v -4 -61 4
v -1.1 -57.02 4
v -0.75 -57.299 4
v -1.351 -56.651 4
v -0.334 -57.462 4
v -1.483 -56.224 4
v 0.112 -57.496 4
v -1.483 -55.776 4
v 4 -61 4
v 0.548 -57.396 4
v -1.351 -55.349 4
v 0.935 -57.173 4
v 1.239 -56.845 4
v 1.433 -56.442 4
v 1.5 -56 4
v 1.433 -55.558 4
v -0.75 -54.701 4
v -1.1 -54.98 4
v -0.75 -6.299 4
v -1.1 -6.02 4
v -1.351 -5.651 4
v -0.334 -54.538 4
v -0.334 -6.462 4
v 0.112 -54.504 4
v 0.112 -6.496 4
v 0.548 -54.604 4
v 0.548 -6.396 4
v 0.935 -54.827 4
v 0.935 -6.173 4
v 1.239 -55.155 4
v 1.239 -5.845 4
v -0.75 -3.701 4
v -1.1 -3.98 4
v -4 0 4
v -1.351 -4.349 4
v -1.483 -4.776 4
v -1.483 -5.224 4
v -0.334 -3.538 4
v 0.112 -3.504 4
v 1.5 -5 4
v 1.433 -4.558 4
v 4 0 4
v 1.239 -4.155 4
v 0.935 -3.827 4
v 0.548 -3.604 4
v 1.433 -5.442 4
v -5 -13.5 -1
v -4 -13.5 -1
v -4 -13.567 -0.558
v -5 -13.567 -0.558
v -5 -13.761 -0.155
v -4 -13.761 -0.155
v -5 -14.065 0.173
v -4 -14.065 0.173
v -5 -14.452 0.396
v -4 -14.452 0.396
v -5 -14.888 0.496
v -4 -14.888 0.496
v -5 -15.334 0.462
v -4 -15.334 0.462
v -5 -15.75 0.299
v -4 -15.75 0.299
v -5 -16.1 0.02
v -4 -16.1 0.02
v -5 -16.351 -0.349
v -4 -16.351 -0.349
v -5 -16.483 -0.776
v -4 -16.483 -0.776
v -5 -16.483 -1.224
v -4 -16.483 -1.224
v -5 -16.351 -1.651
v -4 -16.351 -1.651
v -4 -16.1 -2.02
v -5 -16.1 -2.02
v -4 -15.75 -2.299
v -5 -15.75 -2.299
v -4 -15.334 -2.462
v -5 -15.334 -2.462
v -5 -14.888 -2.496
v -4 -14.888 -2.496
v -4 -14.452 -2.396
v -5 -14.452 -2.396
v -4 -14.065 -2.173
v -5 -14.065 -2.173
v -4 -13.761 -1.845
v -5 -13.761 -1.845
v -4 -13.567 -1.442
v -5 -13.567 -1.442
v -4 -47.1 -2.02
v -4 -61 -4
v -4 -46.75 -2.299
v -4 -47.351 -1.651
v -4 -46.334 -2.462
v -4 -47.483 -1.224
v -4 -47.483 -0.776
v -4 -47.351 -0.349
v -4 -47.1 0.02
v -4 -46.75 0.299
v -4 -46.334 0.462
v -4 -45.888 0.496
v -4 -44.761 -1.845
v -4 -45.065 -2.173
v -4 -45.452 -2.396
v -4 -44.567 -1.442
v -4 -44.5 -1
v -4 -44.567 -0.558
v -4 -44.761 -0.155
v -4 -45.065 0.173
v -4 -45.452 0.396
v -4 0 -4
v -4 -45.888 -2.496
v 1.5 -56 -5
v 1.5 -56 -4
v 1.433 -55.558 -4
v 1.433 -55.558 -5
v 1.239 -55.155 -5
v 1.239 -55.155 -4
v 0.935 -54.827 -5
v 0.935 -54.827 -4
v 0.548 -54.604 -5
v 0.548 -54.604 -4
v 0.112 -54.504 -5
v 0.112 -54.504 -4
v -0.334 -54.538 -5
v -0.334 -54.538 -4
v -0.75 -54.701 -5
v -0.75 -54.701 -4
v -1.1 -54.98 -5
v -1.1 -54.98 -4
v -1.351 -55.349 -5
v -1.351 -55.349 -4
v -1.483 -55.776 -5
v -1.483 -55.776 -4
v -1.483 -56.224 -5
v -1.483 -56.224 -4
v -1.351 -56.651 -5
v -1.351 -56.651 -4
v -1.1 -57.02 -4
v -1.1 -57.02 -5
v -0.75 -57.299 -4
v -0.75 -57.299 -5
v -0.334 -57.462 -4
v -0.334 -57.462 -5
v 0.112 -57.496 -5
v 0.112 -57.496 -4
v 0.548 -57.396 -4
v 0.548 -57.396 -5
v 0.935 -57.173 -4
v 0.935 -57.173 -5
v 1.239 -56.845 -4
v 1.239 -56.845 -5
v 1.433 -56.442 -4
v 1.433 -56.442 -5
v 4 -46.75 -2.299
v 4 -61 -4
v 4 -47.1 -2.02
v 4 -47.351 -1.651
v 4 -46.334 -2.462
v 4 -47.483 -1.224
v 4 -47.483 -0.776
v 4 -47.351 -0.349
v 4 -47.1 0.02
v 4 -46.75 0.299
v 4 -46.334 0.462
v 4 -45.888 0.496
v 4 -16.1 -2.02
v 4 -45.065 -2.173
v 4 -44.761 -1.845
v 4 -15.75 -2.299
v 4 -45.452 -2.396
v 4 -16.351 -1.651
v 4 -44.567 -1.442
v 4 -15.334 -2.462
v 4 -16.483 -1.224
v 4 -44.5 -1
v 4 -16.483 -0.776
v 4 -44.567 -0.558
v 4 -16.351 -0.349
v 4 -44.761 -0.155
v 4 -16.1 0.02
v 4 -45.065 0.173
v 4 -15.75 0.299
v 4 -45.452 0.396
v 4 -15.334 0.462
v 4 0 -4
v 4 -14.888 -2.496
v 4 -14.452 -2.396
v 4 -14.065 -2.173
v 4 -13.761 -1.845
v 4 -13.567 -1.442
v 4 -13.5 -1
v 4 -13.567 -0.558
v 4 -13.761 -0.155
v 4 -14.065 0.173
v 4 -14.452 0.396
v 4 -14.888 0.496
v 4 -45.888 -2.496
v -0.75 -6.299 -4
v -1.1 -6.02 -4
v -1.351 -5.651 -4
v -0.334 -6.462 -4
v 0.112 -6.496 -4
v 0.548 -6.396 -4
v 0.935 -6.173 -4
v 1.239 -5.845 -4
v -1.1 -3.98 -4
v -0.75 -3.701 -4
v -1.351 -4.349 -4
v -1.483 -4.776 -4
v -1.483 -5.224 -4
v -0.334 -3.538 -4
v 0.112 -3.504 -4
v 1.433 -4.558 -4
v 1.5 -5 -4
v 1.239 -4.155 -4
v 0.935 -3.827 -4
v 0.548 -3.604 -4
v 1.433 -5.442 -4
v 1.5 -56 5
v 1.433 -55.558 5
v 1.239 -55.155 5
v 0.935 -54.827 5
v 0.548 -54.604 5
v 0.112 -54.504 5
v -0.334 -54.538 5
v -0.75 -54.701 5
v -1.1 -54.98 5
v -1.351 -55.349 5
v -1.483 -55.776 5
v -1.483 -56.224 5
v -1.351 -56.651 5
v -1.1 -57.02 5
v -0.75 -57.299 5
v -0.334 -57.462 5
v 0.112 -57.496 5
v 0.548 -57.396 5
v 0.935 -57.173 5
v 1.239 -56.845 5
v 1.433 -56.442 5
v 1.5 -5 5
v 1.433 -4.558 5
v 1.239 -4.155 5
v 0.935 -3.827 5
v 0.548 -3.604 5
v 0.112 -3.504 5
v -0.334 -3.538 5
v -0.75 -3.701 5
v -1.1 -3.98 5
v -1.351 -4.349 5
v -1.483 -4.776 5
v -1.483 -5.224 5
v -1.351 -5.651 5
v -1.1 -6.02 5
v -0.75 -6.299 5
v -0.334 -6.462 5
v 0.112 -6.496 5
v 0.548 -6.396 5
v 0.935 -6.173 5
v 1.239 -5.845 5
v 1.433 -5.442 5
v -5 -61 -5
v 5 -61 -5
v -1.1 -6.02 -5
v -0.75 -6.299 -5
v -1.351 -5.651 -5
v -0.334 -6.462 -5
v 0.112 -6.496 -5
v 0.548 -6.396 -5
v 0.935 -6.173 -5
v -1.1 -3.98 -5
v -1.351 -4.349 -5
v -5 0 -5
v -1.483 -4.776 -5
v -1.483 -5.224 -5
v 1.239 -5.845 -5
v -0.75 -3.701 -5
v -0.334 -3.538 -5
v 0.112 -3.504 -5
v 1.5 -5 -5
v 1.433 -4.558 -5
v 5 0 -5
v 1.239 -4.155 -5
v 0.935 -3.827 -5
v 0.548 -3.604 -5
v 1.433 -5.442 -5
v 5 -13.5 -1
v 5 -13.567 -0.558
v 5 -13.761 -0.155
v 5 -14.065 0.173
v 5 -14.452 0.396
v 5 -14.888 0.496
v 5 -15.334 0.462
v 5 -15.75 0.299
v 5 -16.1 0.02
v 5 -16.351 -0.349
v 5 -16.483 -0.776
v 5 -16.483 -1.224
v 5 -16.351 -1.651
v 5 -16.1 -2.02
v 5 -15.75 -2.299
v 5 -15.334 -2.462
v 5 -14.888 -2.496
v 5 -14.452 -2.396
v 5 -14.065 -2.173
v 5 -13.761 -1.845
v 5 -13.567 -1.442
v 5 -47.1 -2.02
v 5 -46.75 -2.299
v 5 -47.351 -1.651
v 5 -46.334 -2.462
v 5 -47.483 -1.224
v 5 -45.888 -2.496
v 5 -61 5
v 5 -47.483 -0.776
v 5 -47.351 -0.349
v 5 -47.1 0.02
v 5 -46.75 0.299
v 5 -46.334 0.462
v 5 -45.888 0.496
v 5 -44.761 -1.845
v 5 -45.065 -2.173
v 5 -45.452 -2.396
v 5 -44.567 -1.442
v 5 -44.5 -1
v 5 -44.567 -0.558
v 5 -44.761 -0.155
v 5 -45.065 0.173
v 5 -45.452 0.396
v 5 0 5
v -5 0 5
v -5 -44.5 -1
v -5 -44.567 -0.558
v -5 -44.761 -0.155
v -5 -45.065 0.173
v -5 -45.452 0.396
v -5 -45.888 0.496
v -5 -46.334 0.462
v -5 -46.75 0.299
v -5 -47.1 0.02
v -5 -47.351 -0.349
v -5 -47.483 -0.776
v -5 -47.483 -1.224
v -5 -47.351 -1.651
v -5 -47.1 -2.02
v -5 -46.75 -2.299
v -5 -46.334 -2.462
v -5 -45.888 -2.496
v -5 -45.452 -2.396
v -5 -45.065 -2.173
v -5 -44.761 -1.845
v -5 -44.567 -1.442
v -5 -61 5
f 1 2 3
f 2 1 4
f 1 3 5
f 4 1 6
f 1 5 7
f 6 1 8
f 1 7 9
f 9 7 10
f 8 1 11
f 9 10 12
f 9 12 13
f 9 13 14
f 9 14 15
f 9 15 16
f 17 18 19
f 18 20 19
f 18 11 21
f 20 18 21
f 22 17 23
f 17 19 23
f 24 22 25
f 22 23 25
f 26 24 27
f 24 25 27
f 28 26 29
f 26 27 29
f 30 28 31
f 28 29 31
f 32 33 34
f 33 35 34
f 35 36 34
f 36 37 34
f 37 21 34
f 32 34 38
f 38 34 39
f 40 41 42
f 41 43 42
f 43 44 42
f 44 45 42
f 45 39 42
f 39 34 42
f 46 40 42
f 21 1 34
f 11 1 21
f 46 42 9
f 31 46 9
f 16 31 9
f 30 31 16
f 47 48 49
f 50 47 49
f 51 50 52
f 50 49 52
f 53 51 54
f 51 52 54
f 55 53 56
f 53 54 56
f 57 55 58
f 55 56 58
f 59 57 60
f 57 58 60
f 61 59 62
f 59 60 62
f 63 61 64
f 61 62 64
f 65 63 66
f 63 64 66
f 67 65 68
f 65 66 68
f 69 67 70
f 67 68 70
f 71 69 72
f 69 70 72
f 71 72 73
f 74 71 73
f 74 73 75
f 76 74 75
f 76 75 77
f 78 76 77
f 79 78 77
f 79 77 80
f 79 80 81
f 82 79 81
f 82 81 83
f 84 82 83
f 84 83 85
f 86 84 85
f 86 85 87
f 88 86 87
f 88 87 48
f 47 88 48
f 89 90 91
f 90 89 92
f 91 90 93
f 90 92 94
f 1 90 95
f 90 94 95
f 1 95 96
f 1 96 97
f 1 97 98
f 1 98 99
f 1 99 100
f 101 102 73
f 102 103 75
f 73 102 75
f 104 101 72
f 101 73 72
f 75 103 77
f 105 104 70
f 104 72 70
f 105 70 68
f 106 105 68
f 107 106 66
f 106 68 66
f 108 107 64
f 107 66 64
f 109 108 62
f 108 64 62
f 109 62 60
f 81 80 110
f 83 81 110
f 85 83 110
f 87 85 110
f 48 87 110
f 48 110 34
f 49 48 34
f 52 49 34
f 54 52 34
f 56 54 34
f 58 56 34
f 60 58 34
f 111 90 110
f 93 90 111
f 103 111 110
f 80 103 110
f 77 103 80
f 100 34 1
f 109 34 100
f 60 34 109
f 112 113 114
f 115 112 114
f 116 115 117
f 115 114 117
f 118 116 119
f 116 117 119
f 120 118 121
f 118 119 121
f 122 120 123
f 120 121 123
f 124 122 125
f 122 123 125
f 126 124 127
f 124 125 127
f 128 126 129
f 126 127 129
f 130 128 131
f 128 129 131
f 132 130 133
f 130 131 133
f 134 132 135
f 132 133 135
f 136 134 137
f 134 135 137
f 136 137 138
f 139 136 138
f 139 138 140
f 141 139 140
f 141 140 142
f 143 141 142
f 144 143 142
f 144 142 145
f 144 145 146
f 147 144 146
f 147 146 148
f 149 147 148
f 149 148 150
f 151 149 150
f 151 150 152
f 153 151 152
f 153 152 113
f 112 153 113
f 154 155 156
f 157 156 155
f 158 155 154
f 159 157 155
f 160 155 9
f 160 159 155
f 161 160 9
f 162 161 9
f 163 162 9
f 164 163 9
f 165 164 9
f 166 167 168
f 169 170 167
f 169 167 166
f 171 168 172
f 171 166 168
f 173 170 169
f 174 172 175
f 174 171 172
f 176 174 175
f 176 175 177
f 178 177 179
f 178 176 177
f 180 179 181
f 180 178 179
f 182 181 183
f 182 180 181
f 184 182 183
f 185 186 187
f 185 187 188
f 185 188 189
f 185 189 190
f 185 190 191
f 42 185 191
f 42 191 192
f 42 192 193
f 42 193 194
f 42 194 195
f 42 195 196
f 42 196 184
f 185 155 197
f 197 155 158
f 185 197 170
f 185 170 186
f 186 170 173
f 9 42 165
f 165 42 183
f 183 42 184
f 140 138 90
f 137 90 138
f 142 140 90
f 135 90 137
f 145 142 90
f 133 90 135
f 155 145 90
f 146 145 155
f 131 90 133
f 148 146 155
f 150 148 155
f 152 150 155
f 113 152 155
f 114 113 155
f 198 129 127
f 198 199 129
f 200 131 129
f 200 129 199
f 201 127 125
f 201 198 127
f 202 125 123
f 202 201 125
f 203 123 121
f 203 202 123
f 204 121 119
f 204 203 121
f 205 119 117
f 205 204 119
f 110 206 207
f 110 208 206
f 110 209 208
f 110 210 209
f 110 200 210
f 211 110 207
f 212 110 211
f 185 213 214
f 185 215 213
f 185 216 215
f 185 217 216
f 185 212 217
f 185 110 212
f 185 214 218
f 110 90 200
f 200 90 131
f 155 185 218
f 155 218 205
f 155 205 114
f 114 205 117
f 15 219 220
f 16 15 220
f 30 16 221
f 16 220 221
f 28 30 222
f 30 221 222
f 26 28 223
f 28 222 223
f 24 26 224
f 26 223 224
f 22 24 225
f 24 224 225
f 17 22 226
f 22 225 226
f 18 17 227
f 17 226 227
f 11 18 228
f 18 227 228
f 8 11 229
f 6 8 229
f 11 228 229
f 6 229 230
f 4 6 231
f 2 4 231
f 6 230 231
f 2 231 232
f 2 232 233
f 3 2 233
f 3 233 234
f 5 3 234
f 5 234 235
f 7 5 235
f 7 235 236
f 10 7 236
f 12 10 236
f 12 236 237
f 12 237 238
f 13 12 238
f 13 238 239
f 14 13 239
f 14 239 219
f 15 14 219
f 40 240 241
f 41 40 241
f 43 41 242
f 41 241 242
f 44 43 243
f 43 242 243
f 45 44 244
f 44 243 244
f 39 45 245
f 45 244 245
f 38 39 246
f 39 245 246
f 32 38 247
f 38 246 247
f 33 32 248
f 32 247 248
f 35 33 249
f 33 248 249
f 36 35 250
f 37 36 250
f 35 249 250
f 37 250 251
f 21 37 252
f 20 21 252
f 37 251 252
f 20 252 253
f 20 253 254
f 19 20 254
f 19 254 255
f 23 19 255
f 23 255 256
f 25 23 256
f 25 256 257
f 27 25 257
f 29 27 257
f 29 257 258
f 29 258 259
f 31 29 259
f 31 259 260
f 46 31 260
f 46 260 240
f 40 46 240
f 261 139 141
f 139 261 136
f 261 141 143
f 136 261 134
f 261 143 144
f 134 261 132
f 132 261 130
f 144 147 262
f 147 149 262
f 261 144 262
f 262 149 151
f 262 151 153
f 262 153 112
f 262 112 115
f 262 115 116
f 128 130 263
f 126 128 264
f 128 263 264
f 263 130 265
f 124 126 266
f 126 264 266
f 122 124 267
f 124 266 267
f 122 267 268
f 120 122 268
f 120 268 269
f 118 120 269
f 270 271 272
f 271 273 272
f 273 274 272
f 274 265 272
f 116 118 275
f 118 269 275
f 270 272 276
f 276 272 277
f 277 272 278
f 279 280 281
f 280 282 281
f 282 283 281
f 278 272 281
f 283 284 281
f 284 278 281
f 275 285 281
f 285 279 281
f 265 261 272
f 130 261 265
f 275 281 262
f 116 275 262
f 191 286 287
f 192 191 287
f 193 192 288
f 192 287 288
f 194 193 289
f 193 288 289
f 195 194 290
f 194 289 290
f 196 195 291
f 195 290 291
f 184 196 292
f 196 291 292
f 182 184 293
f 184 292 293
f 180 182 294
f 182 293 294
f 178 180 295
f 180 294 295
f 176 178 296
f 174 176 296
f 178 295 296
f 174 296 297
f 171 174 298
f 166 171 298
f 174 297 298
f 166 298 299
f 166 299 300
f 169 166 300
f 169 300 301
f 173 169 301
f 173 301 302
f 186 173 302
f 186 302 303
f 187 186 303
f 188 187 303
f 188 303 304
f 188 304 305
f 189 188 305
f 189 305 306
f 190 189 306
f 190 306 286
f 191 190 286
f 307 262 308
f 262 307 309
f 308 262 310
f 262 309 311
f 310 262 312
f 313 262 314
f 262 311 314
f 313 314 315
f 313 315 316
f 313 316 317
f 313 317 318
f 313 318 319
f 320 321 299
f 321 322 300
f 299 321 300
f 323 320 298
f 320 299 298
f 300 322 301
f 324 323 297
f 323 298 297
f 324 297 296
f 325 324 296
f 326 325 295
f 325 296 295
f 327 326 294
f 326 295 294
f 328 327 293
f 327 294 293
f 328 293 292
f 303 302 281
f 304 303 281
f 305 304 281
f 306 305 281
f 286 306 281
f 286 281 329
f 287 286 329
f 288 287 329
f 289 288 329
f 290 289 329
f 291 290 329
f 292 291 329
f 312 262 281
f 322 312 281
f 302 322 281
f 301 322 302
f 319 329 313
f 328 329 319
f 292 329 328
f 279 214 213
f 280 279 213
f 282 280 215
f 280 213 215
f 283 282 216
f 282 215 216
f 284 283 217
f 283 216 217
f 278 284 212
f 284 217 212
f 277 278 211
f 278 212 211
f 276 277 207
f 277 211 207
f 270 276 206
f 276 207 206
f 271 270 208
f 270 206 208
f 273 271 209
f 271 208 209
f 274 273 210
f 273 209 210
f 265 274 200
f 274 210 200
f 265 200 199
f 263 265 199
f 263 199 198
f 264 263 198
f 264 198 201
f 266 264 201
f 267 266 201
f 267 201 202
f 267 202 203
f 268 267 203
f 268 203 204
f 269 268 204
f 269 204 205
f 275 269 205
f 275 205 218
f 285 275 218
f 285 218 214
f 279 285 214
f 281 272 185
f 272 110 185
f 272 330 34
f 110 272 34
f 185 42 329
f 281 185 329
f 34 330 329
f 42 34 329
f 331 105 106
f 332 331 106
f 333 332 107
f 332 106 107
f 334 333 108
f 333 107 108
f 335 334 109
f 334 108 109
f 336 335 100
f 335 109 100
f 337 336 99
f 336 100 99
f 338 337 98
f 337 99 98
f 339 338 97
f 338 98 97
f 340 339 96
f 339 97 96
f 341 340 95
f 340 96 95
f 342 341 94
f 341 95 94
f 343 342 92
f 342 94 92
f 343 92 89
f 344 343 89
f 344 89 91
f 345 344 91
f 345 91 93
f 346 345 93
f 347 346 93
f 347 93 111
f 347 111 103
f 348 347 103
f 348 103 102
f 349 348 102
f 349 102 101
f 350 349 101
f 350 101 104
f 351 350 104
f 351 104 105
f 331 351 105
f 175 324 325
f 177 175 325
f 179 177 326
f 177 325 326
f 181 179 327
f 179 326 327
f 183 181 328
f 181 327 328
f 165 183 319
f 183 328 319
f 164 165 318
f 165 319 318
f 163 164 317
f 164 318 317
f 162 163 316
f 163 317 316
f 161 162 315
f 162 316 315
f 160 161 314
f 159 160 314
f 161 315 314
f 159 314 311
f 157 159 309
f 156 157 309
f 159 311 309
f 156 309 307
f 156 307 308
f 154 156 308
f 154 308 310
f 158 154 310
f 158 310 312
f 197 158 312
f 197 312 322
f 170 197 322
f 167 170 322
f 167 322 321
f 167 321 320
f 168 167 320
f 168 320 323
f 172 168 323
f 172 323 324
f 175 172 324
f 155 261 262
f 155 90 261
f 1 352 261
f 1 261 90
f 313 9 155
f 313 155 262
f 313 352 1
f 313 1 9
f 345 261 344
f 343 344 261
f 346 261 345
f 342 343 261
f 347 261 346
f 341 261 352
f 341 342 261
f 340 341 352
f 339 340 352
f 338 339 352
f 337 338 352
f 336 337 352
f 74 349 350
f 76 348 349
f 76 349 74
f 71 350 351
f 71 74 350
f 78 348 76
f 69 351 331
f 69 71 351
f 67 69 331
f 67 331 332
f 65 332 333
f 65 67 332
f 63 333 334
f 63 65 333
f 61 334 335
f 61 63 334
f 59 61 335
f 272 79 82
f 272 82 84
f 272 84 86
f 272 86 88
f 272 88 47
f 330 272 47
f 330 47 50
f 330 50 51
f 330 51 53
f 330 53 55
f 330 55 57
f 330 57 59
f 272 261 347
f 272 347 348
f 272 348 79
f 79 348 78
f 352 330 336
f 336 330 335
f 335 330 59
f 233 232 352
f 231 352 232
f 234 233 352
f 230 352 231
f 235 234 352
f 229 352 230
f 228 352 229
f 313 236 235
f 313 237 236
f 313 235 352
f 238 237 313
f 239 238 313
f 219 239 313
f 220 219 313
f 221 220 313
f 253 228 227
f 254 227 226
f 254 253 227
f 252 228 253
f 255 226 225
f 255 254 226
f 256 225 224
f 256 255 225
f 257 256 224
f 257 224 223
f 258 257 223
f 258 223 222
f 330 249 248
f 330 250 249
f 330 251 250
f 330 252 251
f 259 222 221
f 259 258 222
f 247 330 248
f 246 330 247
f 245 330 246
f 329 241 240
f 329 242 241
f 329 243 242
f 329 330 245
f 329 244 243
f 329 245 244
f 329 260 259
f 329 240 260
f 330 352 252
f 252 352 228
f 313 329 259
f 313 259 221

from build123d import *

# Parameters (mm, degrees)
F0_W     = 10
F0_H     = 10
F0_W_2   = 8
F0_H_2   = 8
F1_DEPTH = 61
F2_R     = 1.5
F3_DEPTH = 25
F4_R     = 1.5
F5_DEPTH = 25


with BuildPart() as f1:
    # F0 (on Front) → F1 (new body)
    with BuildSketch(Plane.XZ):
        Rectangle(F0_W, F0_H)
        Rectangle(F0_W_2, F0_H_2, mode=Mode.SUBTRACT)
    extrude(amount=F1_DEPTH)

    # F2 (on face) → F3 (cut)
    with BuildSketch(Plane.XY.offset(5)):
        with Locations((0, -5)):
            Circle(F2_R)
        with Locations((0, -56)):
            Circle(F2_R)
    extrude(amount=-F3_DEPTH, mode=Mode.SUBTRACT)

    # F4 (on face) → F5 (cut)
    with BuildSketch(Plane.YZ.offset(5)):
        with Locations((-15, -1)):
            Circle(F4_R)
        with Locations((-46, -1)):
            Circle(F4_R)
    extrude(amount=-F5_DEPTH, mode=Mode.SUBTRACT)


solid = f1.part
